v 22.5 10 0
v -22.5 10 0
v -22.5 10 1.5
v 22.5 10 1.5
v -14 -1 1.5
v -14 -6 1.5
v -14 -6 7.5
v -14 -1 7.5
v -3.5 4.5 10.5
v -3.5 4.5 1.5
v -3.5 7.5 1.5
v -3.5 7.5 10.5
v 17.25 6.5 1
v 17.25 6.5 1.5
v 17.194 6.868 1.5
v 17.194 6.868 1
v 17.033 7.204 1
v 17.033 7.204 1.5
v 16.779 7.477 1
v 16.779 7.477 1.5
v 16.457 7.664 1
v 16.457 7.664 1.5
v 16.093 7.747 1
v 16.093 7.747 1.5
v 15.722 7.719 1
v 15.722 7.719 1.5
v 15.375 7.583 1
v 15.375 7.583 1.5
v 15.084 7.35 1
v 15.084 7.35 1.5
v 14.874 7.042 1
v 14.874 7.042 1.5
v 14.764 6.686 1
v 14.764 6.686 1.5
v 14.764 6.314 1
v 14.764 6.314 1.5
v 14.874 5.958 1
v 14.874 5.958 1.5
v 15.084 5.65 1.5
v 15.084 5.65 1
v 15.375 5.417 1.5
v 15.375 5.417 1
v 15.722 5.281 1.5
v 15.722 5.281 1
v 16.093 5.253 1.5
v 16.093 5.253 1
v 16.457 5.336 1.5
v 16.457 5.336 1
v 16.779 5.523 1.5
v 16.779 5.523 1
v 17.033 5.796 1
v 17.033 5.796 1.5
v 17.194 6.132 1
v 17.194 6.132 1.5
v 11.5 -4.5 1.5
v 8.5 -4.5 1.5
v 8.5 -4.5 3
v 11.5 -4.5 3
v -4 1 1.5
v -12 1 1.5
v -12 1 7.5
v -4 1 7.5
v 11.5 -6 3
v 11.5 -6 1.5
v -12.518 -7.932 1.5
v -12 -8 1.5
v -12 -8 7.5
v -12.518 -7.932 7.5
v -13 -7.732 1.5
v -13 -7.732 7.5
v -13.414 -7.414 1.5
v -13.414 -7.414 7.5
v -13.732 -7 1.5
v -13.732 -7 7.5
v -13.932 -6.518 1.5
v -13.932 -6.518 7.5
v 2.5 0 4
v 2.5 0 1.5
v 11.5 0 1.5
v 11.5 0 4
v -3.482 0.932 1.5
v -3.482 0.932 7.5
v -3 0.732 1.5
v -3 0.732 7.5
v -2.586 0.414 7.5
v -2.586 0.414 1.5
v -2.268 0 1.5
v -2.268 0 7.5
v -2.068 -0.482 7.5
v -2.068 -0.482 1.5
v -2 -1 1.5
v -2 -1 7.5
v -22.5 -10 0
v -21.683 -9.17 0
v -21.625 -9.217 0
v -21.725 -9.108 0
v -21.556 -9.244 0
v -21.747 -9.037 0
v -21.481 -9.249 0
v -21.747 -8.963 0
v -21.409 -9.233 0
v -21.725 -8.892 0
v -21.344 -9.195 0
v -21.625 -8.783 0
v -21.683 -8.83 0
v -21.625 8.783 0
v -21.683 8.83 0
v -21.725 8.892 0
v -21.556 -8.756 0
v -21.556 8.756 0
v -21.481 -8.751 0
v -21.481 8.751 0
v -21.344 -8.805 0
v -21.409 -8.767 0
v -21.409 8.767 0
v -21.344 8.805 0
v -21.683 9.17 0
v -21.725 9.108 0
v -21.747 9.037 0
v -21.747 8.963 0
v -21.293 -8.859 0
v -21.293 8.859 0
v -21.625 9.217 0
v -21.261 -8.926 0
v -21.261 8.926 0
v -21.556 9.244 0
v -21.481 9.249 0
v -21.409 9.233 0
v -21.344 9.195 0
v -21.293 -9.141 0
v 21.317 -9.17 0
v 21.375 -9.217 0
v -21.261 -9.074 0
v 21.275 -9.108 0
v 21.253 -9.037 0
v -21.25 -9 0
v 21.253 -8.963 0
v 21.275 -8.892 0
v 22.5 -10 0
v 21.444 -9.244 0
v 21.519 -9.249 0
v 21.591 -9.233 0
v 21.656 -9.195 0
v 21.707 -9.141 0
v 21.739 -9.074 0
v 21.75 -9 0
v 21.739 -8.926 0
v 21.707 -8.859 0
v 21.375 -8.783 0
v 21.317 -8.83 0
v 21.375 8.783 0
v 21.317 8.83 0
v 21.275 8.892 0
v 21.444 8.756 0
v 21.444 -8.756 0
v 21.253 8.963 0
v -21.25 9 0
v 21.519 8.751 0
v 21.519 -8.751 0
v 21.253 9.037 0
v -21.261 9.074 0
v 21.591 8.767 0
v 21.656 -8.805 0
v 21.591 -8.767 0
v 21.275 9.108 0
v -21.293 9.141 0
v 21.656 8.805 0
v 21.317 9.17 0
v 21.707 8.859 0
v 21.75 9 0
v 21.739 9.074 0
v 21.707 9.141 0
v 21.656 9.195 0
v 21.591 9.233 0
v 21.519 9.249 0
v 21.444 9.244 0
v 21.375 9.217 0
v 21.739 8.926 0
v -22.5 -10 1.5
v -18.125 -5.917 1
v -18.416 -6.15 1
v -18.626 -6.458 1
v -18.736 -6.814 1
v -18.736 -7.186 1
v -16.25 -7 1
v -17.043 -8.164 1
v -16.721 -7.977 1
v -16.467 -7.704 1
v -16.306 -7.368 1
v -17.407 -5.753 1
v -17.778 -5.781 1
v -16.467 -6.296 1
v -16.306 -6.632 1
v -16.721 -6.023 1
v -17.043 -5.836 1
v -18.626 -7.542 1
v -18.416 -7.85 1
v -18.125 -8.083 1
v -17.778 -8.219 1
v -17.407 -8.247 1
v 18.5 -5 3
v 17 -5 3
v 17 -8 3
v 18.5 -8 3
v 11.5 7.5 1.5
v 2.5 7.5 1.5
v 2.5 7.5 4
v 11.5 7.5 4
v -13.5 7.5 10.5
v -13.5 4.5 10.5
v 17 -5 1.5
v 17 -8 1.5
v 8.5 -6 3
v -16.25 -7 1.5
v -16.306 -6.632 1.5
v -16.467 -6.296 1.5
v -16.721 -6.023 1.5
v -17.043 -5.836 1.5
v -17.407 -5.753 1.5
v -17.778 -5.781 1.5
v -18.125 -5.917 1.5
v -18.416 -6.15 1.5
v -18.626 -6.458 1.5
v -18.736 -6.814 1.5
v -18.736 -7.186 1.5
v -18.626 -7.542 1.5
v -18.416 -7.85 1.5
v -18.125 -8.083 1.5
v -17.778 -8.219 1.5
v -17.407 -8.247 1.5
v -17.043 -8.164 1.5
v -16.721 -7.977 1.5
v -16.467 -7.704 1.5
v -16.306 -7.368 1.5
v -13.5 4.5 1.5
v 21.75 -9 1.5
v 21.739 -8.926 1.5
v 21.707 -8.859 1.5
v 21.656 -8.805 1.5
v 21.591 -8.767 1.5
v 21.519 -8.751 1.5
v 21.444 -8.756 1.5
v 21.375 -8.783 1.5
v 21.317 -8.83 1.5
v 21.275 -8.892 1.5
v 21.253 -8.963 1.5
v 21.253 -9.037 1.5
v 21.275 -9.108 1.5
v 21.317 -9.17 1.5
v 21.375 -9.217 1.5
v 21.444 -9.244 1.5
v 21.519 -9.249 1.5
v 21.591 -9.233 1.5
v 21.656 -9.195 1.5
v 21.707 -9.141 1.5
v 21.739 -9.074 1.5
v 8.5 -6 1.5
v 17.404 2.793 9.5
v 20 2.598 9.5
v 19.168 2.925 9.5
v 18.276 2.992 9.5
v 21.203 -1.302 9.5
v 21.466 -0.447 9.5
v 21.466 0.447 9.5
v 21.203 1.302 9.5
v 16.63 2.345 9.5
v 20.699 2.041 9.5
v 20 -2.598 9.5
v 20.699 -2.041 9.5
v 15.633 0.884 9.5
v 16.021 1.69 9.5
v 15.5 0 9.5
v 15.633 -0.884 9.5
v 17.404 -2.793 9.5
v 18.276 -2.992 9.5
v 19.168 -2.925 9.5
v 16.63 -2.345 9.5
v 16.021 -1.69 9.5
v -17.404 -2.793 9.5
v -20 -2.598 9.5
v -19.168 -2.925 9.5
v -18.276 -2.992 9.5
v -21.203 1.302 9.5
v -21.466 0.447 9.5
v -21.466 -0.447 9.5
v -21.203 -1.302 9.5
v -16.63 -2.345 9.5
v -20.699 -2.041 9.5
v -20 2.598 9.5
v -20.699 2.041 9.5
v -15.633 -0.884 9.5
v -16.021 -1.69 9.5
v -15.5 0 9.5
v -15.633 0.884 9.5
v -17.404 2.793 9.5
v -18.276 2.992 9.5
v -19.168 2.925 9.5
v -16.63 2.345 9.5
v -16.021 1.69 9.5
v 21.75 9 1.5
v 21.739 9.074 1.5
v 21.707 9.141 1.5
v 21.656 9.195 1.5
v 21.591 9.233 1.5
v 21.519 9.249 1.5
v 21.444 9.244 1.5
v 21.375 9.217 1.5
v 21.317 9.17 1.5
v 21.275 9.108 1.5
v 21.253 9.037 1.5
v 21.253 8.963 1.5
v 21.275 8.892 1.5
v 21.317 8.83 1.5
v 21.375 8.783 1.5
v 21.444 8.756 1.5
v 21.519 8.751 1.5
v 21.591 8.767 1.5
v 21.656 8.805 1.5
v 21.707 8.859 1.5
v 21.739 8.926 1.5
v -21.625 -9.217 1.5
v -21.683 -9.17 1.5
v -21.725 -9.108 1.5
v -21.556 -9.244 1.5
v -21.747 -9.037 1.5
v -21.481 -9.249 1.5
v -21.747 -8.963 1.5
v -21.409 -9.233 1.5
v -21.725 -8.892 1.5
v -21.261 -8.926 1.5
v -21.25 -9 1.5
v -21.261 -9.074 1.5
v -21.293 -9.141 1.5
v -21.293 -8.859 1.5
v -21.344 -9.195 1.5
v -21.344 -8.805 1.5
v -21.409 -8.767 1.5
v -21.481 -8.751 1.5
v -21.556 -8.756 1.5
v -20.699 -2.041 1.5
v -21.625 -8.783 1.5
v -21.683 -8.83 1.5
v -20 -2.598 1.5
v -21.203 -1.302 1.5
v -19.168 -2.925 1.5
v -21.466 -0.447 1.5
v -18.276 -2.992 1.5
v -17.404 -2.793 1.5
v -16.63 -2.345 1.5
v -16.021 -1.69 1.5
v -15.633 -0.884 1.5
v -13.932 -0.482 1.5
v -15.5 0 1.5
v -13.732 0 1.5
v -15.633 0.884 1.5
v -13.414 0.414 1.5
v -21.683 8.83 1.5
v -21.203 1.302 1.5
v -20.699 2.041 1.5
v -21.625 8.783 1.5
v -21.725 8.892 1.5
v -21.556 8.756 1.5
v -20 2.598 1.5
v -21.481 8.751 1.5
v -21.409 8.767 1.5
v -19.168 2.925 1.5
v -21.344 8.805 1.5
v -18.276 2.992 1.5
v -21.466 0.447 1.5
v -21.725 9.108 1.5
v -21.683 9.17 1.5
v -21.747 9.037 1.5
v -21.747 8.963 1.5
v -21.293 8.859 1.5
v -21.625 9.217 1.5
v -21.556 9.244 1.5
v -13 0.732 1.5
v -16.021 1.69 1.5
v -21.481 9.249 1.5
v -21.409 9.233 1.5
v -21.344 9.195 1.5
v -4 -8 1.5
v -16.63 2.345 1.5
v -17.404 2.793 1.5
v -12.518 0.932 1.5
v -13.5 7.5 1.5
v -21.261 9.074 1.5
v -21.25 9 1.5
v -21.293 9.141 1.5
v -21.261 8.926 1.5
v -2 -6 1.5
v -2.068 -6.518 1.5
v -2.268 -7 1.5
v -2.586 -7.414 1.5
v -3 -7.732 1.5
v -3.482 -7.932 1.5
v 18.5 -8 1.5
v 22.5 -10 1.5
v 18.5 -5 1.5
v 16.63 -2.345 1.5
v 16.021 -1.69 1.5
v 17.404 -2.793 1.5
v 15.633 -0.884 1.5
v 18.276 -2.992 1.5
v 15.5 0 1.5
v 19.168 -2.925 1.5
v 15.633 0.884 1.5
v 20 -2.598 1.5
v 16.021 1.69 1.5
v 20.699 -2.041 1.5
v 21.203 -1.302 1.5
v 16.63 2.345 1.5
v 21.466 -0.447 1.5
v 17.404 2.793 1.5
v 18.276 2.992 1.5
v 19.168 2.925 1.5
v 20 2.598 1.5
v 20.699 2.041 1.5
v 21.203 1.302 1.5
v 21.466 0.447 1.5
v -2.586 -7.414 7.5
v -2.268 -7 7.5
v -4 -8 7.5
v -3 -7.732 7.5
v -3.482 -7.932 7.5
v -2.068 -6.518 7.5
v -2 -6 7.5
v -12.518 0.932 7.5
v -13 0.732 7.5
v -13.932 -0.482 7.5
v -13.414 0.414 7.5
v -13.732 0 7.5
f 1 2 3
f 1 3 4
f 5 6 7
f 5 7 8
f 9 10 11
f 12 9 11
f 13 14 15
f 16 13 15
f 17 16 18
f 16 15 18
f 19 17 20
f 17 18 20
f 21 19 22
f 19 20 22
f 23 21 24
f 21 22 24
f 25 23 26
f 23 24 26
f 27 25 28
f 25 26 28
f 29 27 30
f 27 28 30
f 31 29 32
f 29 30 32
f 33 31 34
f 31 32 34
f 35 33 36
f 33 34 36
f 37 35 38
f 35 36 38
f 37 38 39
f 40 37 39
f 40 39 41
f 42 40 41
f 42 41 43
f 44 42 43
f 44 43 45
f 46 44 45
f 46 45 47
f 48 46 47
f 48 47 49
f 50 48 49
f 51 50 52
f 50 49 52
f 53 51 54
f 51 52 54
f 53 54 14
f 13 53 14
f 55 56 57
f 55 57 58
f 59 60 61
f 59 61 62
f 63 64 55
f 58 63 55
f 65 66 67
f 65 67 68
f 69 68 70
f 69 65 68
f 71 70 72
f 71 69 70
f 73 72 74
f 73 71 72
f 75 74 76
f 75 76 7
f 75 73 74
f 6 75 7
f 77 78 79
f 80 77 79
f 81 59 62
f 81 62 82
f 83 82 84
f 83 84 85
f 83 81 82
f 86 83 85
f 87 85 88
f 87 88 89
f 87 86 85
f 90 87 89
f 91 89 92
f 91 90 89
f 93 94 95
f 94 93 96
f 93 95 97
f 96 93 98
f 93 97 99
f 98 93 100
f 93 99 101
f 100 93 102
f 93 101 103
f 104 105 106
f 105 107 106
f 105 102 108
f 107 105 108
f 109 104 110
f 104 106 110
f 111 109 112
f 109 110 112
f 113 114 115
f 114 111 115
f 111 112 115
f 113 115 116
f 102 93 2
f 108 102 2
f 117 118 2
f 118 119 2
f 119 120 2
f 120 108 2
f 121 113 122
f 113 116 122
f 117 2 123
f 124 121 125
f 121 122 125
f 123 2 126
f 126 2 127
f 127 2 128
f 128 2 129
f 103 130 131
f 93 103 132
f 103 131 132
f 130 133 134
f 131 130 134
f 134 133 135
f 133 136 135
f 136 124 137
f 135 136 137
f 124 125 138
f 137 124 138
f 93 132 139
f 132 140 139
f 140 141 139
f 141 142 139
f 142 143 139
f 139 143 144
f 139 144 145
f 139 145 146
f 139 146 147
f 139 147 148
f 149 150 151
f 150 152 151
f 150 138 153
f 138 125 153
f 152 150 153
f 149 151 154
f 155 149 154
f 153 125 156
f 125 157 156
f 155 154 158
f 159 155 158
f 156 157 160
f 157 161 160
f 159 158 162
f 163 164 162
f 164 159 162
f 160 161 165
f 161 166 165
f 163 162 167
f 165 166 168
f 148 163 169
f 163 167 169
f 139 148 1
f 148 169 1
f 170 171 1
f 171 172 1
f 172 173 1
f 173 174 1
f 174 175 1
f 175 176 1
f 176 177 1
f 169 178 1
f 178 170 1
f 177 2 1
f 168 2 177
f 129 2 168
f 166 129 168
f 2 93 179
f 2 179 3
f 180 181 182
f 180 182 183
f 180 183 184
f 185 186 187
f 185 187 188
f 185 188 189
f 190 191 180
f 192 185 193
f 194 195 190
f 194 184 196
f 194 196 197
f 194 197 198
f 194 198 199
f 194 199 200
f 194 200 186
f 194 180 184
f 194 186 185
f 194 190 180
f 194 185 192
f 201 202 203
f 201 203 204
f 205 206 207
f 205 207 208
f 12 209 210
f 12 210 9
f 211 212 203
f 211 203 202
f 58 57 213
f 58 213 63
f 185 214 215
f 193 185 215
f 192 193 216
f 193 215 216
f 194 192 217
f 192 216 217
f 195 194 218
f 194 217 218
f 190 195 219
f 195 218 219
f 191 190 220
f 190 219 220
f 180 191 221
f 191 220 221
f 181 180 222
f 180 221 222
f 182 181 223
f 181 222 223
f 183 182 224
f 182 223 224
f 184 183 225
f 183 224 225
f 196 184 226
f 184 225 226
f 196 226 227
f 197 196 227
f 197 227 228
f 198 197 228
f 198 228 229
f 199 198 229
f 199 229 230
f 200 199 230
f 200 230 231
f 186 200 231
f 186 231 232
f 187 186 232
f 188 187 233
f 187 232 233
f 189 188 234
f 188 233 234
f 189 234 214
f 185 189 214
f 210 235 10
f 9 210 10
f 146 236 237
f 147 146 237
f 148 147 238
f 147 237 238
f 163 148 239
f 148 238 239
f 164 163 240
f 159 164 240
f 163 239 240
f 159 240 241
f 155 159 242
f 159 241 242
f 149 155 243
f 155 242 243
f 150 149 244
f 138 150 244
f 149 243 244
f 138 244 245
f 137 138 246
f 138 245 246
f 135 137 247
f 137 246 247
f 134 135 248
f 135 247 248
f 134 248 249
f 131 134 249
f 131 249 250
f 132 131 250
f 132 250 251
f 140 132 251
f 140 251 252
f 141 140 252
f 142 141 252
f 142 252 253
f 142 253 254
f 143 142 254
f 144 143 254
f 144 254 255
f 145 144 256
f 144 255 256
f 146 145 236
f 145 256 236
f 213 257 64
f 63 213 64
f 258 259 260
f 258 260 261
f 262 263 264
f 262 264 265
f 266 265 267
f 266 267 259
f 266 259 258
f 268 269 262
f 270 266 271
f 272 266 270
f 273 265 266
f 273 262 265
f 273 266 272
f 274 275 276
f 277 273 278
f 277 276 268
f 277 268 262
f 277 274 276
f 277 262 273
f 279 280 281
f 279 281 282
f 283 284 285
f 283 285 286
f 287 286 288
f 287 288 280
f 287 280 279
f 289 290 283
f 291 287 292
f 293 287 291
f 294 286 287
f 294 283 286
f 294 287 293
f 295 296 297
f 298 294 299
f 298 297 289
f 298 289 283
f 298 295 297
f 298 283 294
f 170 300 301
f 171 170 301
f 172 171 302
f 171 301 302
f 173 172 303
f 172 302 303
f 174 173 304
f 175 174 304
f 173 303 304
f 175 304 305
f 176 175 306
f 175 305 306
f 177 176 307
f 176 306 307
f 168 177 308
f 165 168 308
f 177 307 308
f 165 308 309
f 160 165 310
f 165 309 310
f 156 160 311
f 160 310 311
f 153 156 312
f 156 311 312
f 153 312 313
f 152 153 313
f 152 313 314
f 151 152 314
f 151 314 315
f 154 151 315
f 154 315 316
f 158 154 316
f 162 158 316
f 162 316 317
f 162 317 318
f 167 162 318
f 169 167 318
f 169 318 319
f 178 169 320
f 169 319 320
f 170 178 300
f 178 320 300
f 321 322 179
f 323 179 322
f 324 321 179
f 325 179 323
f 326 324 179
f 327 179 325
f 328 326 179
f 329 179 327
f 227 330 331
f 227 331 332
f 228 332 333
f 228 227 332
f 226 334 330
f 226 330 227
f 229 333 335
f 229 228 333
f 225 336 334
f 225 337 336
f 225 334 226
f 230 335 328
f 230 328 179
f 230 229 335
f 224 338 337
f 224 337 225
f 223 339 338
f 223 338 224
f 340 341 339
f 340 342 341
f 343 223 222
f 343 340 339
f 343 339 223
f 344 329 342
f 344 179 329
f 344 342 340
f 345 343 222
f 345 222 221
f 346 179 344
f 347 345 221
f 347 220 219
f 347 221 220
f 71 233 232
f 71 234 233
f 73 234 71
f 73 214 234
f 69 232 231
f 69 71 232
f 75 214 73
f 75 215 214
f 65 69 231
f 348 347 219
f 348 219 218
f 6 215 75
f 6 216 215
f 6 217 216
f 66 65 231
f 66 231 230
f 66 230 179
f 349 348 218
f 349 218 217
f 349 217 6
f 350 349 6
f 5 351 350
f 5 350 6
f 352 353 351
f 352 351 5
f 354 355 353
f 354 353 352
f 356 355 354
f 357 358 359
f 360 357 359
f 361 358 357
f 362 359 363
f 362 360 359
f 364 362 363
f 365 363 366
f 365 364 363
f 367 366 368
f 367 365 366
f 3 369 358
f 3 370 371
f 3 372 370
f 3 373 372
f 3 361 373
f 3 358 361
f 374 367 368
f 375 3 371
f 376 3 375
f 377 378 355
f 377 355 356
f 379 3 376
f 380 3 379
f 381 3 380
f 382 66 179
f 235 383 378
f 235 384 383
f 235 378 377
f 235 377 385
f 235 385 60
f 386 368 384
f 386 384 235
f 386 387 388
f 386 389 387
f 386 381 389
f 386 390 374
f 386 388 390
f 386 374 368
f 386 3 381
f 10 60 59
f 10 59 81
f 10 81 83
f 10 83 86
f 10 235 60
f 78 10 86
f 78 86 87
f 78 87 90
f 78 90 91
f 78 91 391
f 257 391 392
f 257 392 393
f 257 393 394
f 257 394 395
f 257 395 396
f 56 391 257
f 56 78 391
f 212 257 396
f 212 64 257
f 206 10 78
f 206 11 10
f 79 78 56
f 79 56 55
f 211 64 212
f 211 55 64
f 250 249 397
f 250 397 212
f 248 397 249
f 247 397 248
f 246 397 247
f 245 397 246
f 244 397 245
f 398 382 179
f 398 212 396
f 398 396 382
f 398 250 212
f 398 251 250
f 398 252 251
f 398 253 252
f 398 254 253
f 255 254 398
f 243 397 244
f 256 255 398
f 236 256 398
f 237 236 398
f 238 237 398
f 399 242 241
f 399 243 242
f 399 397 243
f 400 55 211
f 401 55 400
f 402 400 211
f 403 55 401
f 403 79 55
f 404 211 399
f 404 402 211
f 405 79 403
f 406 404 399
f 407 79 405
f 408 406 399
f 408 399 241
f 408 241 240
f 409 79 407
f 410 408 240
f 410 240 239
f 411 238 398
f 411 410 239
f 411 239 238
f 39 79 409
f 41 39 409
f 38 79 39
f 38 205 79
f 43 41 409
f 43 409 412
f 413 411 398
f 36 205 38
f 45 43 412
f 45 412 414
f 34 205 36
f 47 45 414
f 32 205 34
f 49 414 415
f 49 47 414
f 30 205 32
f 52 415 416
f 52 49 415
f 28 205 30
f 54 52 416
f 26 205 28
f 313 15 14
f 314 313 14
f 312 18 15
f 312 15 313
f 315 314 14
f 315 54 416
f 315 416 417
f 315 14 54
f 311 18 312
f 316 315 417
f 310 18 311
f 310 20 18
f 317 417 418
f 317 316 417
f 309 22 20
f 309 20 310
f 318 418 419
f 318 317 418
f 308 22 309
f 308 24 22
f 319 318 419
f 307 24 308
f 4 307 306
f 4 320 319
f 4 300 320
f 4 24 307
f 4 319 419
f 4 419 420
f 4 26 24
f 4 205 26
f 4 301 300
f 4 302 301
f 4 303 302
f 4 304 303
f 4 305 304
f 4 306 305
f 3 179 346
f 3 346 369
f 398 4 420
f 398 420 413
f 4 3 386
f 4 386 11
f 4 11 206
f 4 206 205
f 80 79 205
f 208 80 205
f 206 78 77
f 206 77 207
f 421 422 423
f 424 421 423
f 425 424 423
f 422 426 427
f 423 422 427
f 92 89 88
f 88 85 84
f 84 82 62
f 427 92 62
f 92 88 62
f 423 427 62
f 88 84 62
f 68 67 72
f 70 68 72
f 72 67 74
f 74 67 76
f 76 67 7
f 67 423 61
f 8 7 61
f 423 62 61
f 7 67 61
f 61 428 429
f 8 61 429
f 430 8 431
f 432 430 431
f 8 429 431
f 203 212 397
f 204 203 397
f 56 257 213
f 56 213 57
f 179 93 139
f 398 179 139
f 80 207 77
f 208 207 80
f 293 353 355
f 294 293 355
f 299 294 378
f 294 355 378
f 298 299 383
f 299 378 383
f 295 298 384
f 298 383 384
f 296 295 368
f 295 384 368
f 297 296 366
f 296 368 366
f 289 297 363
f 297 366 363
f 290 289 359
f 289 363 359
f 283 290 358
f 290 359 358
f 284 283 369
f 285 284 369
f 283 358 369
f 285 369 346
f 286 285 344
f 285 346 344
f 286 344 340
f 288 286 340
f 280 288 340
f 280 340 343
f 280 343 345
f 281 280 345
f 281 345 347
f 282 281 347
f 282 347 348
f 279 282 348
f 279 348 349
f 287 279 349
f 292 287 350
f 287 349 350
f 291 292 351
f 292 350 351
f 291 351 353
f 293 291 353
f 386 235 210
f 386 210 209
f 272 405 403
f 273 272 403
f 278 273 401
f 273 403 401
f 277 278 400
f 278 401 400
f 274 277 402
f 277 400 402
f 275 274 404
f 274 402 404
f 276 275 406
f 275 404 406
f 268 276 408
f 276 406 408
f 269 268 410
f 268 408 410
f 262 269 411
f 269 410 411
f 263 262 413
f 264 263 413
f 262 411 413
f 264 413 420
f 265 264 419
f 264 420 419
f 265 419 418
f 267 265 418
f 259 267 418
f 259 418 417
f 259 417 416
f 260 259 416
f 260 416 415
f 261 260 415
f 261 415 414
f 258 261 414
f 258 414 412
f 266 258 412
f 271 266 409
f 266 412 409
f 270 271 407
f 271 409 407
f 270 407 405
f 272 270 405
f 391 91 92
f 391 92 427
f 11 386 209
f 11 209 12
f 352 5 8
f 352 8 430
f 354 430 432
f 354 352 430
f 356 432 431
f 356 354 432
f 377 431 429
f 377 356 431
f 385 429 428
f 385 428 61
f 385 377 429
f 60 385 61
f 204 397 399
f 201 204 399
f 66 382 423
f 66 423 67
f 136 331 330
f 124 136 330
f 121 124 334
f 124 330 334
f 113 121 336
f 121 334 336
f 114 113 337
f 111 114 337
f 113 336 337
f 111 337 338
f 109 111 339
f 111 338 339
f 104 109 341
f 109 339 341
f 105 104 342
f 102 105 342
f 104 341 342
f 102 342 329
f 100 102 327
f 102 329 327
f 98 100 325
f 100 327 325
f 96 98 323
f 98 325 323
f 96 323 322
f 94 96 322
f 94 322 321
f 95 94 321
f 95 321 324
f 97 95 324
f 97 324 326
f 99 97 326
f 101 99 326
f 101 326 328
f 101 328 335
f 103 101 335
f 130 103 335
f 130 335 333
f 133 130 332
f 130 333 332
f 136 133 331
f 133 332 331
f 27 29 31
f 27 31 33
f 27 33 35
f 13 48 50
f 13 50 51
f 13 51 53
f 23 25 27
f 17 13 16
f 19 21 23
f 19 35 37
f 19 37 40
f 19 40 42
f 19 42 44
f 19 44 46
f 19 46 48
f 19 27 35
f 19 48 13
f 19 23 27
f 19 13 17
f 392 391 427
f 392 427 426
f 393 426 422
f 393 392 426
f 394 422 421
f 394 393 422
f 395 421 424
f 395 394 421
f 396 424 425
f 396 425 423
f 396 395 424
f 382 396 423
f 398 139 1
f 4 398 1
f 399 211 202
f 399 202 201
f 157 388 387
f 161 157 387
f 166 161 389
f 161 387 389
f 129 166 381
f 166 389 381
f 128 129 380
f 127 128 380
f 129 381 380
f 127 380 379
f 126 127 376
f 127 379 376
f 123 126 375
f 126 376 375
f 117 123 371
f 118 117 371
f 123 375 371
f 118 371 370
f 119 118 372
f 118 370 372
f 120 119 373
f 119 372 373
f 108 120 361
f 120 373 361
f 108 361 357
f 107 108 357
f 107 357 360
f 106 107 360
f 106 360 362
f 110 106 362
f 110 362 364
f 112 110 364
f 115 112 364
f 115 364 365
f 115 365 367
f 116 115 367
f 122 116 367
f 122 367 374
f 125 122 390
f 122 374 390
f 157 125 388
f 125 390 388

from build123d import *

# Parameters (mm, degrees)
SKETCH1_W           = 45
SKETCH1_H           = 20
BOSS_EXTRUDE1_DEPTH = 1.5
SKETCH2_R           = 3
BOSS_EXTRUDE3_DEPTH = 8
SKETCH3_W           = 10
SKETCH3_H           = 3
BOSS_EXTRUDE4_DEPTH = 9
BOSS_EXTRUDE5_DEPTH = 6
SKETCH6_W           = 9
SKETCH6_H           = 7.5
BOSS_EXTRUDE6_DEPTH = 2.5
SKETCH7_W           = 1.5
SKETCH7_H           = 3
SKETCH7_W_2         = 3
SKETCH7_H_2         = 1.5
BOSS_EXTRUDE7_DEPTH = 1.5
SKETCH9_R           = 1.25
CUT_EXTRUDE1_DEPTH  = 0.5
SKETCH10_R          = 1.25
CUT_EXTRUDE2_DEPTH  = 0.5
SKETCH12_R          = 0.25
CUT_EXTRUDE3_DEPTH  = 1.5


with BuildPart() as part:
    # Sketch1 → Boss-Extrude1 (new body)
    with BuildSketch(Plane.XY):
        Rectangle(SKETCH1_W, SKETCH1_H)
    extrude(amount=BOSS_EXTRUDE1_DEPTH)

    # Sketch2 → Boss-Extrude3 (add)
    with BuildSketch(Plane.XY.offset(1.5)):
        with Locations((-18.5, 0)):
            Circle(SKETCH2_R)
        with Locations(Location((18.5, 0, 0), (0, 0, 180))):
            Circle(SKETCH2_R)
    extrude(amount=BOSS_EXTRUDE3_DEPTH)

    # Sketch3 → Boss-Extrude4 (add)
    with BuildSketch(Plane.XY.offset(1.5)):
        with Locations((-8.5, 6)):
            Rectangle(SKETCH3_W, SKETCH3_H)
    extrude(amount=BOSS_EXTRUDE4_DEPTH)

    # Sketch5 → Boss-Extrude5 (add)
    with BuildSketch(Plane.XY.offset(1.5)):
        with BuildLine():
            Line((-12, 1), (-4, 1))
            ThreePointArc((-4, 1), (-2.585786438, 0.414213562), (-2, -1))
            Line((-2, -1), (-2, -6))
            ThreePointArc((-2, -6), (-2.585786438, -7.414213562), (-4, -8))
            Line((-4, -8), (-12, -8))
            ThreePointArc((-12, -8), (-13.414213562, -7.414213562), (-14, -6))
            Line((-14, -6), (-14, -1))
            ThreePointArc((-14, -1), (-13.414213562, 0.414213562), (-12, 1))
        make_face()
    extrude(amount=BOSS_EXTRUDE5_DEPTH)

    # Sketch6 → Boss-Extrude6 (add)
    with BuildSketch(Plane.XY.offset(1.5)):
        with Locations((7, 3.75)):
            Rectangle(SKETCH6_W, SKETCH6_H)
    extrude(amount=BOSS_EXTRUDE6_DEPTH)

    # Sketch7 → Boss-Extrude7 (add)
    with BuildSketch(Plane.XY.offset(1.5)):
        with Locations((17.75, -6.5)):
            Rectangle(SKETCH7_W, SKETCH7_H)
        with Locations((10, -5.25)):
            Rectangle(SKETCH7_W_2, SKETCH7_H_2)
    extrude(amount=BOSS_EXTRUDE7_DEPTH)

    # Sketch9 → Cut-Extrude1 (cut)
    with BuildSketch(Plane.XY.offset(1.5)):
        with Locations((-17.5, -7)):
            Circle(SKETCH9_R)
    extrude(amount=-CUT_EXTRUDE1_DEPTH, mode=Mode.SUBTRACT)

    # Sketch10 → Cut-Extrude2 (cut)
    with BuildSketch(Plane.XY.offset(1.5)):
        with Locations((16, 6.5)):
            Circle(SKETCH10_R)
    extrude(amount=-CUT_EXTRUDE2_DEPTH, mode=Mode.SUBTRACT)

    # Sketch12 → Cut-Extrude3 (cut)
    with BuildSketch(Plane.XY.offset(1.5)):
        with Locations((-21.5, 9)):
            Circle(SKETCH12_R)
        with Locations((21.5, 9)):
            Circle(SKETCH12_R)
        with Locations((21.5, -9)):
            Circle(SKETCH12_R)
        with Locations((-21.5, -9)):
            Circle(SKETCH12_R)
    extrude(amount=-CUT_EXTRUDE3_DEPTH, mode=Mode.SUBTRACT)


solid = part.part
